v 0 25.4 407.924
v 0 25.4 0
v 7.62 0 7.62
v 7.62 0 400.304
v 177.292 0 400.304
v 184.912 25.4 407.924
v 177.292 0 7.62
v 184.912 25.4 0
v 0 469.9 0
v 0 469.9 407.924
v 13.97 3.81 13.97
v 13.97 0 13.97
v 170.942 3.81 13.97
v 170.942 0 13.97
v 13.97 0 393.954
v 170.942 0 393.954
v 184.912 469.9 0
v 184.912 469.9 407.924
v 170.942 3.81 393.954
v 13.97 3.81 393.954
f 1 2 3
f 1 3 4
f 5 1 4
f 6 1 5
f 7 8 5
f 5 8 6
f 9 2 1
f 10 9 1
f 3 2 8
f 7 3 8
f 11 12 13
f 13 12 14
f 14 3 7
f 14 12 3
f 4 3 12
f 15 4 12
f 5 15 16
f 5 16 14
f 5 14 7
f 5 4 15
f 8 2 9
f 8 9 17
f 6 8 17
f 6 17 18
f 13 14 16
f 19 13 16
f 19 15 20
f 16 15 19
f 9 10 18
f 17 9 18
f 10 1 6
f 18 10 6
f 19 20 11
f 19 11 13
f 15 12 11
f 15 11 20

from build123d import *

# Parameters (mm, degrees)
F0_W     = 184.912
F0_H     = 407.924
F1_DEPTH = 469.9
F2_SIZE2 = 25.4
F2_SIZE  = 7.62
F3_W     = 156.972
F3_H     = 379.984
F4_DEPTH = 3.81


with BuildPart() as f1:
    # F0 (on Front) → F1 (new body)
    with BuildSketch(Plane.XZ):
        with Locations((92.456, 203.962)):
            Rectangle(F0_W, F0_H)
    extrude(amount=-F1_DEPTH)

    # F2
    f2_edges = [f1.edges().sort_by_distance(p)[0] for p in [
        (0, 0, 203.962),
        (92.456, 0, 407.924),
        (184.912, 0, 203.962),
        (92.456, 0, 0),
    ]]
    f2_side = f1.faces().sort_by_distance((92.456, 0, 203.962))[0]
    chamfer(f2_edges, length=F2_SIZE, length2=F2_SIZE2, reference=f2_side)

    # F3 (on face) → F4 (cut)
    with BuildSketch(Plane.XZ):
        with Locations((92.456, 203.962)):
            Rectangle(F3_W, F3_H)
    extrude(amount=-F4_DEPTH, mode=Mode.SUBTRACT)


solid = f1.part
